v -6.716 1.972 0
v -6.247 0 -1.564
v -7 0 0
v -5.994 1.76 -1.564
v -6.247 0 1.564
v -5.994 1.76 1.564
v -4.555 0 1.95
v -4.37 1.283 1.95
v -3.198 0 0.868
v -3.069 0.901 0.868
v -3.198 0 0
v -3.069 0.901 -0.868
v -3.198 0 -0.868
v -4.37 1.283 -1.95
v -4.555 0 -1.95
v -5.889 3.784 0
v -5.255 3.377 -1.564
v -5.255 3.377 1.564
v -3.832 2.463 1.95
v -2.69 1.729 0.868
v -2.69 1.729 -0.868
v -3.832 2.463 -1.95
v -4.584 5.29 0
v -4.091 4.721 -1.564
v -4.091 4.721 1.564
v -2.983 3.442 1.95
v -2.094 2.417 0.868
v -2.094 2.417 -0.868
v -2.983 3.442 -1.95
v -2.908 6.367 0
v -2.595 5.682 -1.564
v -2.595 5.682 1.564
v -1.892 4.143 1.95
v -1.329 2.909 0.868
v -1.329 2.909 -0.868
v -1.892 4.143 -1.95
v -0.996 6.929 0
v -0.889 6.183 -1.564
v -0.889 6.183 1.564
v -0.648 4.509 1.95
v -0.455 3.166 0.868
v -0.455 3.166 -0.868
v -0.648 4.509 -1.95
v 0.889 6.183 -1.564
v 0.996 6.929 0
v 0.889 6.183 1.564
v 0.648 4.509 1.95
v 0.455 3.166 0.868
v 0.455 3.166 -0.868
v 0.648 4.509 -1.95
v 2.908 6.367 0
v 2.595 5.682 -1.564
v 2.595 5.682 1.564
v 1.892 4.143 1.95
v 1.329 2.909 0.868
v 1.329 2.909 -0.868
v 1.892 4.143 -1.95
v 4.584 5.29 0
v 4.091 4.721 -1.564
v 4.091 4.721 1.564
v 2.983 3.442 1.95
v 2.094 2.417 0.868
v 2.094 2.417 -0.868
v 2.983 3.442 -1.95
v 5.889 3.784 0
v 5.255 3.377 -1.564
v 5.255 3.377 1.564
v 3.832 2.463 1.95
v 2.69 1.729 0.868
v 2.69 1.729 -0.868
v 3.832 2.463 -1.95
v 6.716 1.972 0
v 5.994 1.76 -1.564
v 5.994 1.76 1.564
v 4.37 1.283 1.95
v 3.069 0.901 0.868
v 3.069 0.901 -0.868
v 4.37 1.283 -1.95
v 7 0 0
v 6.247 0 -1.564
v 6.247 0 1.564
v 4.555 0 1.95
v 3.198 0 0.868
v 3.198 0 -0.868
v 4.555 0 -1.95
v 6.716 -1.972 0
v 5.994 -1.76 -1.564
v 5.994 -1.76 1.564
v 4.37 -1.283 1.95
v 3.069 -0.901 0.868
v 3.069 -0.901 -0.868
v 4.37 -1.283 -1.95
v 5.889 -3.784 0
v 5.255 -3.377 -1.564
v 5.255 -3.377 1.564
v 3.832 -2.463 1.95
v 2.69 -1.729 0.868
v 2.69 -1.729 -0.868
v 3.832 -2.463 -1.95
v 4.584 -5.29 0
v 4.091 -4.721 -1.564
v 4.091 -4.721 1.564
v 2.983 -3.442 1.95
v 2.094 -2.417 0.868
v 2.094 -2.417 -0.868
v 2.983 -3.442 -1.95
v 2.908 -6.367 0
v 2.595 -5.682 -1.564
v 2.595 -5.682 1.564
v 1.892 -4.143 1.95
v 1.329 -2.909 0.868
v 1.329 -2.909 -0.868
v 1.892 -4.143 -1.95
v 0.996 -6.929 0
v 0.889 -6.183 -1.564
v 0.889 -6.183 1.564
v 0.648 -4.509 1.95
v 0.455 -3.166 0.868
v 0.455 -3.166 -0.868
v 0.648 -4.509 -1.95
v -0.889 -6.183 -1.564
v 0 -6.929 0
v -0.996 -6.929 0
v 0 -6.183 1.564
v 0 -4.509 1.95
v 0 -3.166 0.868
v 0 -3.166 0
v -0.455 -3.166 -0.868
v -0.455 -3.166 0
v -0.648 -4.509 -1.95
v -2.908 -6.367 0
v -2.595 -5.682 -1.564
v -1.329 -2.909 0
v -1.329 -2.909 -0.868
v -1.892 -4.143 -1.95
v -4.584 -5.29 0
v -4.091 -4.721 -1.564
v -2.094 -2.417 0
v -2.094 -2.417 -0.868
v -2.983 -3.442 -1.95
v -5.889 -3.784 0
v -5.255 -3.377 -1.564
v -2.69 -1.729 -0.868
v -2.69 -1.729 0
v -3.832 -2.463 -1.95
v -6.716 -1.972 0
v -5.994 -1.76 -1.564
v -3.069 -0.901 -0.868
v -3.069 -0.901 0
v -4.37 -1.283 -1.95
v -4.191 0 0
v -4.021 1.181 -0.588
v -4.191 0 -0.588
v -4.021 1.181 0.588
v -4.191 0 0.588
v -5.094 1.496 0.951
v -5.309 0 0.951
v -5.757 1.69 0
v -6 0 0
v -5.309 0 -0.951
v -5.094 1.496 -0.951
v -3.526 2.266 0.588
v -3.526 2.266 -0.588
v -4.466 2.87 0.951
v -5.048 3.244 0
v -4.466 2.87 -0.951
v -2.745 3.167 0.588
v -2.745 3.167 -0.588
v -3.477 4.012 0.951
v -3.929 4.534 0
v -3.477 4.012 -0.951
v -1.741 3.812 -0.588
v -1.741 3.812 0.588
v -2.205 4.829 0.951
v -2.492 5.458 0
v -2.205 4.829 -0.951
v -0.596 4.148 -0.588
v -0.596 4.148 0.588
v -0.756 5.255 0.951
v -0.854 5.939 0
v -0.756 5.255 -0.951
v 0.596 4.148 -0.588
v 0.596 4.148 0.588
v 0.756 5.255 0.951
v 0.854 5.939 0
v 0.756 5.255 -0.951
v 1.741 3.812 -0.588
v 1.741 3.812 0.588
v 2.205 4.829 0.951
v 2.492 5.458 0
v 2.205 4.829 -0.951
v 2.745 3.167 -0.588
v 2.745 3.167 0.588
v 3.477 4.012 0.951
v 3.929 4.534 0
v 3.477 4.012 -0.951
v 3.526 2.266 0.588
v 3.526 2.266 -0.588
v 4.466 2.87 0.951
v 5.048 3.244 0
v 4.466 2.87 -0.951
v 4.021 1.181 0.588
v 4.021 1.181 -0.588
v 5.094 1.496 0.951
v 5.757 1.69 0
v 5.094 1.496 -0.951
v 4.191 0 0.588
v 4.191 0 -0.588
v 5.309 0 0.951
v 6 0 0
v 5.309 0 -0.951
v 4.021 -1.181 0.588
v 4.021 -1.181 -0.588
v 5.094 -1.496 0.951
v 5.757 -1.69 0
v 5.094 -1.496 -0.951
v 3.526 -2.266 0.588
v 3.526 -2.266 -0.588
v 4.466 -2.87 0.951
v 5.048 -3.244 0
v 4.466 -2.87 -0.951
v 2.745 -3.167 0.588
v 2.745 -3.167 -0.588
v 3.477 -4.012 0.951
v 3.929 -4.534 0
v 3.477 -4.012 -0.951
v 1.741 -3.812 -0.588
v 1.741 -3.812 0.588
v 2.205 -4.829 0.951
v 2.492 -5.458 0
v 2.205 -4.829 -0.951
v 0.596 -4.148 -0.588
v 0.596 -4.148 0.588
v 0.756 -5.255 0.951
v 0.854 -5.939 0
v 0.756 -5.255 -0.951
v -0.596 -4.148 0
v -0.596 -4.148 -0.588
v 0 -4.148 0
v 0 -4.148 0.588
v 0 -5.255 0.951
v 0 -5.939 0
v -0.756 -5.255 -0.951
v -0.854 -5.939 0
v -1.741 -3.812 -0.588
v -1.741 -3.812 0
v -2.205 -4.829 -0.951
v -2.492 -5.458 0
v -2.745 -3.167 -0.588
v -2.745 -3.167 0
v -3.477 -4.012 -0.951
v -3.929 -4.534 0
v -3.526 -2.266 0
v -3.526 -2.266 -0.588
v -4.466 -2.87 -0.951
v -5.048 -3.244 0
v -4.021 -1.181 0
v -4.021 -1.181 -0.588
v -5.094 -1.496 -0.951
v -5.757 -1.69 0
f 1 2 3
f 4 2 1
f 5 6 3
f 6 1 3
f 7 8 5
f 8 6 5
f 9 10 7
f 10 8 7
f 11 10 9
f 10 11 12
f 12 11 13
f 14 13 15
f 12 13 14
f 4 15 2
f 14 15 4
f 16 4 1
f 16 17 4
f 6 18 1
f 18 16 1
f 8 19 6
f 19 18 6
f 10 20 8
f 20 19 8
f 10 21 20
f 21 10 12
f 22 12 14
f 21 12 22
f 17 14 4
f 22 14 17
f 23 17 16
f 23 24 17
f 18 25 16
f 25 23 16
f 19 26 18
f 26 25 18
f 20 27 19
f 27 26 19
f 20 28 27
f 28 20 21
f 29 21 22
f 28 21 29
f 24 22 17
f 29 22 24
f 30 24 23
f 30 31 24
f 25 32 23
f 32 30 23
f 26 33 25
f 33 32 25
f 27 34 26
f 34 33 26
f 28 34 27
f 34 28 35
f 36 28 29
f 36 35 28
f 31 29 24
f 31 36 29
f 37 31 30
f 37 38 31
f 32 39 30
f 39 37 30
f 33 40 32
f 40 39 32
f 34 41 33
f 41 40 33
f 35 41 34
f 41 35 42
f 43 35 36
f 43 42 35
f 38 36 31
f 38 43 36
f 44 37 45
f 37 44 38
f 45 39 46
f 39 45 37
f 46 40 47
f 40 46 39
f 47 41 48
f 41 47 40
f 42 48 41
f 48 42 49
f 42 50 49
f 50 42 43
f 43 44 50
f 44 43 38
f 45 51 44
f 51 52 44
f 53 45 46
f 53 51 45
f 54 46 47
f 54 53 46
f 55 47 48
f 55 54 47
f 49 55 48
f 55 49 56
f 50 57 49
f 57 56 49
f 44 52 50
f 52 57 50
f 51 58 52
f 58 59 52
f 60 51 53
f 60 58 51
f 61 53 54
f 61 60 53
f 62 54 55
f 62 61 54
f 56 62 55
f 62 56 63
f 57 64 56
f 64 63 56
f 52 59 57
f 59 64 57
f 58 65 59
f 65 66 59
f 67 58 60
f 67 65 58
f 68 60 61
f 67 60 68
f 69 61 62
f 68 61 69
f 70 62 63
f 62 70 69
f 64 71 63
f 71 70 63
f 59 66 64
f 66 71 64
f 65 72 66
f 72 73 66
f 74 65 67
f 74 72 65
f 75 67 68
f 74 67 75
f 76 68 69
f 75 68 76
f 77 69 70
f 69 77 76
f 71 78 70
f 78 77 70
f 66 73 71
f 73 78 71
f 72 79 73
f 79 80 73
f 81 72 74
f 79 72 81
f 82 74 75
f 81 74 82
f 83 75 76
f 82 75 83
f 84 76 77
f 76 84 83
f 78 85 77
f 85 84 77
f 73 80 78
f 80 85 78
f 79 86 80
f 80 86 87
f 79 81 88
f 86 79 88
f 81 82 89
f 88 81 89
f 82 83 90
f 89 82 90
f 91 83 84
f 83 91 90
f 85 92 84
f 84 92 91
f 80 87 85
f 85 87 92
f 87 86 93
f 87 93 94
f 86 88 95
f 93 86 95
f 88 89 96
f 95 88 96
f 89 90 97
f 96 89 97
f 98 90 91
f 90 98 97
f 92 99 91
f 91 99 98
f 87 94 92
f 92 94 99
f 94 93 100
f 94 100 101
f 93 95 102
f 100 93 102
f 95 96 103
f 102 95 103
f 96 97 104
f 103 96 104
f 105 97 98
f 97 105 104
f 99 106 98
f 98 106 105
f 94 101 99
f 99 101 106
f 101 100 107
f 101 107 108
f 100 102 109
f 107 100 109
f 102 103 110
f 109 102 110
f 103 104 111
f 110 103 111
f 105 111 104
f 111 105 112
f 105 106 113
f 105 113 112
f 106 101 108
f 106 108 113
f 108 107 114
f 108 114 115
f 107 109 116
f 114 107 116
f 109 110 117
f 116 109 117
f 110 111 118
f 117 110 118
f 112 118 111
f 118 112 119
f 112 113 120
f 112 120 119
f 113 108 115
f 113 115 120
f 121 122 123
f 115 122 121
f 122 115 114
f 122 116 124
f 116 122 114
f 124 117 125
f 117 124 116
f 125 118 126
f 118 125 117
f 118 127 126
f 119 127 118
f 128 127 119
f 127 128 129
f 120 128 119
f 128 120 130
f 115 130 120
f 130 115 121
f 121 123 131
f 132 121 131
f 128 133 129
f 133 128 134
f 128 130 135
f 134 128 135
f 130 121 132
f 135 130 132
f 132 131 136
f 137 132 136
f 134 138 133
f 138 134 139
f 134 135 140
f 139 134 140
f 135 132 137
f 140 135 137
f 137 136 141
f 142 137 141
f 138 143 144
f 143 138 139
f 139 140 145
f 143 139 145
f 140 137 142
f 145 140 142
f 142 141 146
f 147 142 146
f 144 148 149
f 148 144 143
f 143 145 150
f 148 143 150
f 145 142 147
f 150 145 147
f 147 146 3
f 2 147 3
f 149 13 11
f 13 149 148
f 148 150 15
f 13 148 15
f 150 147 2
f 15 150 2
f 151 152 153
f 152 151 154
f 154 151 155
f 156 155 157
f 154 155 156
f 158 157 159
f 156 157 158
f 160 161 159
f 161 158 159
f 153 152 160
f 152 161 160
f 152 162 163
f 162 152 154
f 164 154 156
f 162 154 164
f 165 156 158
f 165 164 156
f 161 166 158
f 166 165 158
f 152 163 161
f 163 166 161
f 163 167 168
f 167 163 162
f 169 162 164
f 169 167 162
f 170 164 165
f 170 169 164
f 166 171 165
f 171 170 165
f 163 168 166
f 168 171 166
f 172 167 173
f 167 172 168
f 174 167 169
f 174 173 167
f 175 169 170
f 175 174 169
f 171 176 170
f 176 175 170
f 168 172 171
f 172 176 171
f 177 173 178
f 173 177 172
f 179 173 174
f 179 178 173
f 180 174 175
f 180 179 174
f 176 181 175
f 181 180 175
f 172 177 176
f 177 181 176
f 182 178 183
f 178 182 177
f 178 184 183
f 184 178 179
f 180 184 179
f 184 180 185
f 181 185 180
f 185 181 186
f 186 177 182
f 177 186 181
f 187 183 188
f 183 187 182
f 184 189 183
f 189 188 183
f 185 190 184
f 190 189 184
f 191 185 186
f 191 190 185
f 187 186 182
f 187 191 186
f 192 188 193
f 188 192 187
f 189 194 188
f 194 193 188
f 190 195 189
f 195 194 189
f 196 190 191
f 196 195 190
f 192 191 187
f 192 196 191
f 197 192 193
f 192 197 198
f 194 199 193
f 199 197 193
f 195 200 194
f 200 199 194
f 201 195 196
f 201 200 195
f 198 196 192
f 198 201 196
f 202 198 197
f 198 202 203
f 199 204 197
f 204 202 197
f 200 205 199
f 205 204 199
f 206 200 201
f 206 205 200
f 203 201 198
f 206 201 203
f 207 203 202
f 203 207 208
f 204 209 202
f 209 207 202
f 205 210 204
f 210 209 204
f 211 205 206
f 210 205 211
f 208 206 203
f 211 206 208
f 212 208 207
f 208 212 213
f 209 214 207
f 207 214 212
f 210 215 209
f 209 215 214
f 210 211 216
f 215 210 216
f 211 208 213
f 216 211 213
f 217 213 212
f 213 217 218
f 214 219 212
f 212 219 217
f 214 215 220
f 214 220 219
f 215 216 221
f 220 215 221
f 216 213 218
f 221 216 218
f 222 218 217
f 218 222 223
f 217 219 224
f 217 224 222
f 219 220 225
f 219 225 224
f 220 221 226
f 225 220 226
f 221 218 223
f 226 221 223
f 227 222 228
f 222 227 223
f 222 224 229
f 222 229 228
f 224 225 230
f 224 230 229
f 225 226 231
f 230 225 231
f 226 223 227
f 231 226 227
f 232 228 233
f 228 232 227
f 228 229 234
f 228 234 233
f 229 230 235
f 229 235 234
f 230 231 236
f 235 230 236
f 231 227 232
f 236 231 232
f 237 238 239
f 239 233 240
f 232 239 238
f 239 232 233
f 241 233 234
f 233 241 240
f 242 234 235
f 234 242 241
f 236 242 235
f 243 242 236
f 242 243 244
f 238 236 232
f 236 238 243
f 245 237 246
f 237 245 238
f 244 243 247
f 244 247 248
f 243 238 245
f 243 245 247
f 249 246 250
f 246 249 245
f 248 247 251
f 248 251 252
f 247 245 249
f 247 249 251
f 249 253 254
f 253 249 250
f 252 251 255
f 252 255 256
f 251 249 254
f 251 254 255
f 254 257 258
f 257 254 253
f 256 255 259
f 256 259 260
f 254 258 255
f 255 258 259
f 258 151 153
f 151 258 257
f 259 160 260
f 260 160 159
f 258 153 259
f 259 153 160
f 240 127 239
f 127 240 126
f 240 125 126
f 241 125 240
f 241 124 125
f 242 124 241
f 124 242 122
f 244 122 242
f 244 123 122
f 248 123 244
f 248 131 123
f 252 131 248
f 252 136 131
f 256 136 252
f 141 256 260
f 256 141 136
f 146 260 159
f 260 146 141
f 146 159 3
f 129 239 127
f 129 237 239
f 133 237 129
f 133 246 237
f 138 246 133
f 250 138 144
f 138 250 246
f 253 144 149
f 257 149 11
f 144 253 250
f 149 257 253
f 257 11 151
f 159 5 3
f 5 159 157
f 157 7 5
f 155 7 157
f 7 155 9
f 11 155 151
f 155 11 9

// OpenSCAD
module donut() {
  rotate_extrude(convexity=2)
    translate([5,0,0])
      difference() {
        circle(r=2);
        circle(r=1);
      }
}

difference()
{
    donut();
    translate([-10,-10,0]) cube(10);
}
